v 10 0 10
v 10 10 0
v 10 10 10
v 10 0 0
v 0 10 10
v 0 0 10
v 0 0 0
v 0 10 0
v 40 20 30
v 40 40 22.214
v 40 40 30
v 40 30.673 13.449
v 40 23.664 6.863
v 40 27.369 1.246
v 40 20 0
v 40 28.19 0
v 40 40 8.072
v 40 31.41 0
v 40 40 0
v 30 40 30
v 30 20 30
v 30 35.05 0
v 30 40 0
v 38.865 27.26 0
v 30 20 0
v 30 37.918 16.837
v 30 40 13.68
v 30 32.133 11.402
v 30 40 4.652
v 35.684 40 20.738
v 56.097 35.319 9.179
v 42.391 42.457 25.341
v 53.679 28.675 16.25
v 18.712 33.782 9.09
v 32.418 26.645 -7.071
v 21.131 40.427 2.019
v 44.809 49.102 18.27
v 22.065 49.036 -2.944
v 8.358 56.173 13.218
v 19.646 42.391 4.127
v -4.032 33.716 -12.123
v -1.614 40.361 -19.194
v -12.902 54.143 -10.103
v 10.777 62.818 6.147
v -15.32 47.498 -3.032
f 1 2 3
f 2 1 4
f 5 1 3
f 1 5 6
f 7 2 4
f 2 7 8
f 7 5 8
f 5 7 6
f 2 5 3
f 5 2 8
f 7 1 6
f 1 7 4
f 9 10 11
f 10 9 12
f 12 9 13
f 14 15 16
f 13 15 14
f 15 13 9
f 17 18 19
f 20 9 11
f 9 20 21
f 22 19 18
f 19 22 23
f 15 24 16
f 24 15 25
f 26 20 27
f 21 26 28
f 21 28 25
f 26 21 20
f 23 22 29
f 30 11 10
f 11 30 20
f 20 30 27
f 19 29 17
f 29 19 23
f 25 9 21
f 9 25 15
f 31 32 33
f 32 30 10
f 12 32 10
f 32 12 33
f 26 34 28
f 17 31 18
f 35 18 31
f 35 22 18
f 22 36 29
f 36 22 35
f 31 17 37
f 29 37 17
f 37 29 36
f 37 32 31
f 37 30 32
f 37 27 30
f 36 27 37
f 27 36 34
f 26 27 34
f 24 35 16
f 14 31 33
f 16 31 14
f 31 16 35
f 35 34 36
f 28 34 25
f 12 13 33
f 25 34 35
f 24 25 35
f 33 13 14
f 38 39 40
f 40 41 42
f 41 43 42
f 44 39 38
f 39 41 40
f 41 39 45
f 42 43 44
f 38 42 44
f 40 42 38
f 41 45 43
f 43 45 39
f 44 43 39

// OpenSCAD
//Processing同様スラッシュ*2以降はコメントアウト（無効）

// 真ん中に箱を置く

cube(10); //単位はmm

translate([30,20,0]){//移動させる。中括弧は省略できるが見にくくなる
    //幅、奥行き、高さを別々にする、中心に配置する
    cube([10,20,30]);
}

translate([30,20,0]){//毎回原点から移動する
    rotate([40,45,70]){//x軸、y軸、z軸の周りに回転
     cube([10,20,30]);   
    }

}

rotate([40,45,70]){//毎回原点から移動する
    translate([30,20,0]){//x軸、y軸、z軸の周りに回転
     cube([10,20,30]);   
    }

}
